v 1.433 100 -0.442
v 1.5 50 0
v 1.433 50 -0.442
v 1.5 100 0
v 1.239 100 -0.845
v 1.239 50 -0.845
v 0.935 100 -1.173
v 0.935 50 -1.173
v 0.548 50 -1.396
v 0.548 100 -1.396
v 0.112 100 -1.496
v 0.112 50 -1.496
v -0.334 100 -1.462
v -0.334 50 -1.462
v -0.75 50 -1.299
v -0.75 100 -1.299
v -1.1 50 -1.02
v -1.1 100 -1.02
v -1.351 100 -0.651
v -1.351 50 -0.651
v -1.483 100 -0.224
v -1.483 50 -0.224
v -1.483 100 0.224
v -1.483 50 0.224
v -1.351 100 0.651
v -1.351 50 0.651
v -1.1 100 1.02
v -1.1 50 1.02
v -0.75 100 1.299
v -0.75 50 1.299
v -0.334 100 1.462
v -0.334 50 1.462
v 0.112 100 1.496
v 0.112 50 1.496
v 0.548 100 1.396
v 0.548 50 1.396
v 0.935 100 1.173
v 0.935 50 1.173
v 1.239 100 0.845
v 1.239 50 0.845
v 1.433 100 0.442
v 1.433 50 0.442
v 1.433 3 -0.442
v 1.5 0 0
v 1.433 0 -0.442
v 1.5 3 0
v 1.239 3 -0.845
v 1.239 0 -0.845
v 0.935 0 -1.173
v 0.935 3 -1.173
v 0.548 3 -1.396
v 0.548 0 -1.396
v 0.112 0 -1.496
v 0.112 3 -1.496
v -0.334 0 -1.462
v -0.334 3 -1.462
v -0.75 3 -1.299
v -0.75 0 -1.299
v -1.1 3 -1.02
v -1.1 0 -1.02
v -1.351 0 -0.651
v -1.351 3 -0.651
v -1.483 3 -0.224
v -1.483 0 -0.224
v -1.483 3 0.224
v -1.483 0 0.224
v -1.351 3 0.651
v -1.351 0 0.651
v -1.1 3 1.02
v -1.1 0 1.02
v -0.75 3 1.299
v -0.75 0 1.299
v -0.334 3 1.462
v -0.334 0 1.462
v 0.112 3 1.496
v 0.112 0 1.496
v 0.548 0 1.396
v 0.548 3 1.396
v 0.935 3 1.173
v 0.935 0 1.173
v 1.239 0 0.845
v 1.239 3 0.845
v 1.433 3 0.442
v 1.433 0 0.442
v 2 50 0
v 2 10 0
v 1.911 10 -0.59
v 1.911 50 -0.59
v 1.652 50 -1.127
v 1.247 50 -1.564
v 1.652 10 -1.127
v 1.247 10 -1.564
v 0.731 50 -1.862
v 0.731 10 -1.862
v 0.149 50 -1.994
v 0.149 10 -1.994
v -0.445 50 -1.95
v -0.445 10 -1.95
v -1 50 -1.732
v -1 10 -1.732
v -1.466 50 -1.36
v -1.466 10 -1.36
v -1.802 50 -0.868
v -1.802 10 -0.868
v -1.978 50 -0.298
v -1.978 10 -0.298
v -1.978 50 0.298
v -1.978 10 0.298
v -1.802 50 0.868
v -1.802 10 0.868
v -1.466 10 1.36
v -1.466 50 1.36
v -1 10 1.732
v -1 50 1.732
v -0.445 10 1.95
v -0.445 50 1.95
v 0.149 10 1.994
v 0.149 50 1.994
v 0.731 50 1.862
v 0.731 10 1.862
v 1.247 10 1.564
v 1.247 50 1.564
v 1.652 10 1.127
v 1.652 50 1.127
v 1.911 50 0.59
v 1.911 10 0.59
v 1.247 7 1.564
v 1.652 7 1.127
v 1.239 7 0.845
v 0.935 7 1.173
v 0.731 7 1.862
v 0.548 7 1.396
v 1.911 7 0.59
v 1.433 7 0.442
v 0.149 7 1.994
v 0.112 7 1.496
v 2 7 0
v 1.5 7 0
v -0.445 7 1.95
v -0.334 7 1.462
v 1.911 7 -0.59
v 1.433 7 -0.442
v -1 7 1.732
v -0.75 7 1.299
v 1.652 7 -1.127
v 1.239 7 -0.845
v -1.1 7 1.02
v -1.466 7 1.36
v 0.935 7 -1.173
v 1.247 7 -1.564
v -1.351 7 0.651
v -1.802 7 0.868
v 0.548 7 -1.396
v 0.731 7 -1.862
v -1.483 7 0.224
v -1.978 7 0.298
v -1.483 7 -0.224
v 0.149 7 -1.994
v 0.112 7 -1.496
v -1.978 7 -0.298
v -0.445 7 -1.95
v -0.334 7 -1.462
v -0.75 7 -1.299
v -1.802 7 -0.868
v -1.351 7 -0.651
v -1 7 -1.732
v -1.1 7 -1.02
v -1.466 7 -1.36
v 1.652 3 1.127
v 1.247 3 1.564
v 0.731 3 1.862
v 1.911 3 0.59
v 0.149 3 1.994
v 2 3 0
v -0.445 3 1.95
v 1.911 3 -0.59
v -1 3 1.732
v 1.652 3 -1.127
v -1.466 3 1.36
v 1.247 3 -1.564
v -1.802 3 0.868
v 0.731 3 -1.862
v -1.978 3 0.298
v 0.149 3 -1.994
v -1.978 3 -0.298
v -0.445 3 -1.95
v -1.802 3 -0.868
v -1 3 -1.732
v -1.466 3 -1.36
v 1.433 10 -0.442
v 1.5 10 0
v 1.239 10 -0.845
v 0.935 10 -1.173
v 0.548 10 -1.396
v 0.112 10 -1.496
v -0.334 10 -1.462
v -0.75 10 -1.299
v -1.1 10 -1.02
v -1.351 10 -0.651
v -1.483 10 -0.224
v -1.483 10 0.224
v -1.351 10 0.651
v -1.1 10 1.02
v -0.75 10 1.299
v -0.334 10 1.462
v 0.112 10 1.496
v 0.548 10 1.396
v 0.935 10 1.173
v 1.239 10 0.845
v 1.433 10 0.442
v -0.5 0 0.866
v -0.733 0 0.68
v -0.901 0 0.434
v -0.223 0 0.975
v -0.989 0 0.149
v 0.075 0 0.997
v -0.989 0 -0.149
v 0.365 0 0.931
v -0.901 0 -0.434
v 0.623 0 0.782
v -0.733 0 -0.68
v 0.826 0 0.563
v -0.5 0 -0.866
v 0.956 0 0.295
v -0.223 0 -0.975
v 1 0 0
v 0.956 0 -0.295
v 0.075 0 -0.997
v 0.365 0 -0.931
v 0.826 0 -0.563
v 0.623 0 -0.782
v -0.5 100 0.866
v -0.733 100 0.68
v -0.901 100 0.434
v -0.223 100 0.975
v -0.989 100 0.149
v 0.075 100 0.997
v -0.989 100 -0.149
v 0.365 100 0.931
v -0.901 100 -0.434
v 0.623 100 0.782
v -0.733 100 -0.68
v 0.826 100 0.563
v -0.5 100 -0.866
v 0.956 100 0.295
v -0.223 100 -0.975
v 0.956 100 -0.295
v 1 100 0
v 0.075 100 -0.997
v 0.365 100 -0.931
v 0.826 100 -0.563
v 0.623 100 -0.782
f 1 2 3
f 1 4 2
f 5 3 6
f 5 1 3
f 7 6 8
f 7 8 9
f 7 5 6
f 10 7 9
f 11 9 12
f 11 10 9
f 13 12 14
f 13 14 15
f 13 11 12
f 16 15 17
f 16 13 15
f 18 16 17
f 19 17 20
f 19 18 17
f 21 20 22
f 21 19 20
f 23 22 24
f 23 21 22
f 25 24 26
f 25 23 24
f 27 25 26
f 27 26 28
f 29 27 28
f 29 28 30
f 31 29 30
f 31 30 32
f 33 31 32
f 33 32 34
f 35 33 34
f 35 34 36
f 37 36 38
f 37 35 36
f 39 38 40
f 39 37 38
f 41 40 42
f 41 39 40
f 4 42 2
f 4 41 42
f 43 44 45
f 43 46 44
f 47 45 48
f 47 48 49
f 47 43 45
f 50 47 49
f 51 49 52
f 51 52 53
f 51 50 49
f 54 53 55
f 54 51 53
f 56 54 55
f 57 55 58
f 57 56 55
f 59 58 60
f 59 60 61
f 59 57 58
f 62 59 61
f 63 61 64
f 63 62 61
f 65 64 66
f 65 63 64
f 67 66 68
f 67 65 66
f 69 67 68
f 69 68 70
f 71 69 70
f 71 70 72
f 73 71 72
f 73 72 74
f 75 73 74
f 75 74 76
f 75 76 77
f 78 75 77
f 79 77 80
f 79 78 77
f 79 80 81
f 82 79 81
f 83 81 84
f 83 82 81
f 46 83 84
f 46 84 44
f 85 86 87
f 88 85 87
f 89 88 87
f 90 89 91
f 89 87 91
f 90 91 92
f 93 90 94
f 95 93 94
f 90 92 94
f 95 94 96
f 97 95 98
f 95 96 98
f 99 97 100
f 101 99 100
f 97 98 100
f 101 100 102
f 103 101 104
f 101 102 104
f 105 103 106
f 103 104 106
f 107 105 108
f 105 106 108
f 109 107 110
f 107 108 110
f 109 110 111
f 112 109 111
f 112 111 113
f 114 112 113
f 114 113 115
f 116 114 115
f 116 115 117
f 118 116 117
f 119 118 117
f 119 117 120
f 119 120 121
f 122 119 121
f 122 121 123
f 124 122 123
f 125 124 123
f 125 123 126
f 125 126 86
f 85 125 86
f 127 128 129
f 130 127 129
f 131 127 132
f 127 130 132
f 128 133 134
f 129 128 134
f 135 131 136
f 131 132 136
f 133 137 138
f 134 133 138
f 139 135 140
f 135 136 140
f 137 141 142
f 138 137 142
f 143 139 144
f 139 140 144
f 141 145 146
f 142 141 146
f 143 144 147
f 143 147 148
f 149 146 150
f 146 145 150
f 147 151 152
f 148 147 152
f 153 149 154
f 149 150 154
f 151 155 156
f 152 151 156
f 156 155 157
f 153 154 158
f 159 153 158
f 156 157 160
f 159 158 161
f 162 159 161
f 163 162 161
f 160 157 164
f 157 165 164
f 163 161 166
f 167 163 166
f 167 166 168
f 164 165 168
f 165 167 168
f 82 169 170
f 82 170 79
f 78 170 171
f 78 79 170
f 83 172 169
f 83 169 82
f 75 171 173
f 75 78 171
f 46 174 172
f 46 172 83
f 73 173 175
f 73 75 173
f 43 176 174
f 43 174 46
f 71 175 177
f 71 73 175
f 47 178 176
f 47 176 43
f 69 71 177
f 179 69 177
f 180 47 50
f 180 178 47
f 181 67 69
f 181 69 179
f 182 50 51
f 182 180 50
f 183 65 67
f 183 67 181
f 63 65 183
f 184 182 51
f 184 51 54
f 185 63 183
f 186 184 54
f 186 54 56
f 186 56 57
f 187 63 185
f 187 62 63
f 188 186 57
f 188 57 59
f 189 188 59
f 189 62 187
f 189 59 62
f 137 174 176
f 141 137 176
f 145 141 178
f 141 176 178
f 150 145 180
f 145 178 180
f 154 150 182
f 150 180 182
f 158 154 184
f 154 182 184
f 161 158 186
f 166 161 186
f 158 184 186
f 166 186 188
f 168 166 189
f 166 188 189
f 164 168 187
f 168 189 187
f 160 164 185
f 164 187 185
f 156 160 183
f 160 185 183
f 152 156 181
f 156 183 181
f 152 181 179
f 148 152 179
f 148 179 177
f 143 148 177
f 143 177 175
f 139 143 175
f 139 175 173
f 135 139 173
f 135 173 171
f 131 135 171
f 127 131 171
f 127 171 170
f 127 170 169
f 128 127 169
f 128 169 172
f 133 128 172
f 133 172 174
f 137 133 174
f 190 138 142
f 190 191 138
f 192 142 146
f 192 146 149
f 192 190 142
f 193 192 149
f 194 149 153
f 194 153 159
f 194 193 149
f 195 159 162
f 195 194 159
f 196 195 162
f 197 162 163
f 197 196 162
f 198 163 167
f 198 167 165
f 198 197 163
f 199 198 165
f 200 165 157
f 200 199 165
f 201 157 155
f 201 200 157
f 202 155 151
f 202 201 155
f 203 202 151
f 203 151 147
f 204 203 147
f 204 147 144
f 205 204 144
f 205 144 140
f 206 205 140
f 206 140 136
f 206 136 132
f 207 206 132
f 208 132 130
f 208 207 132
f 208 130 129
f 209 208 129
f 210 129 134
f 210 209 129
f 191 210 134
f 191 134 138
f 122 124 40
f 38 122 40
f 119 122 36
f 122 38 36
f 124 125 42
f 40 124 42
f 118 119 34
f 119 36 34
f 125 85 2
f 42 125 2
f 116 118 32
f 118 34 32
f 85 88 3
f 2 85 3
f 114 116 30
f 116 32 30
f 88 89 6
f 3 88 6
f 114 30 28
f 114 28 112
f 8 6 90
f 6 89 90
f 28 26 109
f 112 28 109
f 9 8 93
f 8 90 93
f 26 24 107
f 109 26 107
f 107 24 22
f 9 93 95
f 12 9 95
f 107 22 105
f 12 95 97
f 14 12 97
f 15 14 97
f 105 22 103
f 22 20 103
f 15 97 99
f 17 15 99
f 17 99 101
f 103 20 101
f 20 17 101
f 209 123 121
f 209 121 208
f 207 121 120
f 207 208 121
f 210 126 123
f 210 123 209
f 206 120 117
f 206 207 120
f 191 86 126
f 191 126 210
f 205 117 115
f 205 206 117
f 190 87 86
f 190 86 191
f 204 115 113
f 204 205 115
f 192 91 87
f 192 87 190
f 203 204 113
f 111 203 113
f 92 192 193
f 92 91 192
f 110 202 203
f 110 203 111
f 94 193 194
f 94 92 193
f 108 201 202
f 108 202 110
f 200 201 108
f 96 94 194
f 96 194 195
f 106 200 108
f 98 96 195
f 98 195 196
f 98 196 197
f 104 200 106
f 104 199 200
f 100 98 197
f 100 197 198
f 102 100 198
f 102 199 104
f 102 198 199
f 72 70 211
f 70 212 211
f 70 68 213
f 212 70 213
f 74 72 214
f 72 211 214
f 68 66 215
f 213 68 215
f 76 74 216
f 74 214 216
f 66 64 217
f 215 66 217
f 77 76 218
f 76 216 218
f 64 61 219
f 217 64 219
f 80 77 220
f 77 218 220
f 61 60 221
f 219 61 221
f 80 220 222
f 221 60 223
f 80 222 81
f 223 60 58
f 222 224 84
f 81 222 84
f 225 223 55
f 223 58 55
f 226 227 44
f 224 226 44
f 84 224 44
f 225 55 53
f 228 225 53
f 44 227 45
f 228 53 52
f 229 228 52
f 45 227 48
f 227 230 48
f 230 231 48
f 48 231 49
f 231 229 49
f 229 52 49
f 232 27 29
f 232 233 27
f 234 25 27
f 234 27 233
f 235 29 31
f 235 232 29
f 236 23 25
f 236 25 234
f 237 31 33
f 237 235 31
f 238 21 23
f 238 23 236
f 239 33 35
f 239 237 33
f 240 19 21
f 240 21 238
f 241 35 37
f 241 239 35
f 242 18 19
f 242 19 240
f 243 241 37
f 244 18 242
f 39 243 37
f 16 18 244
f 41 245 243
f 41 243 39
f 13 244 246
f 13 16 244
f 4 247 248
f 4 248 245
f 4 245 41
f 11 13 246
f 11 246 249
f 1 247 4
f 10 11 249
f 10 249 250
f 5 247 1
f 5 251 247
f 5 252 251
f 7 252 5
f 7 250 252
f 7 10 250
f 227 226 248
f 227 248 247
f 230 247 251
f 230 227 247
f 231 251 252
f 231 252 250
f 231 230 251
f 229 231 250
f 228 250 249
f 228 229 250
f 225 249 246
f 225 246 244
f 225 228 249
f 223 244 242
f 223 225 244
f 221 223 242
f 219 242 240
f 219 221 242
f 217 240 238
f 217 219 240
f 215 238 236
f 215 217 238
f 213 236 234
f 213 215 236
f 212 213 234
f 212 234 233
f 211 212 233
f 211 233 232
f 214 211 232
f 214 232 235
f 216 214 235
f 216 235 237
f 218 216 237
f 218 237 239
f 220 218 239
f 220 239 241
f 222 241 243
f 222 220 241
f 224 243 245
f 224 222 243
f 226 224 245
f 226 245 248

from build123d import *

# Parameters (mm, degrees)
SKETCH_1_R      = 2
SKETCH_1_R_2    = 1
EXTRUDE_1_DEPTH = 100
SKETCH_2_W      = 0.5
SKETCH_2_H      = 3
SKETCH_4_W      = 0.5
SKETCH_4_H      = 50


with BuildPart() as part:
    # Эскиз1 → Бобышка-Вытянуть1 (new body)
    with BuildSketch(Plane(origin=(0, 0, 0), x_dir=(1, 0, 0), z_dir=(0, 1, 0))):
        Circle(SKETCH_1_R)
        Circle(SKETCH_1_R_2, mode=Mode.SUBTRACT)
    extrude(amount=EXTRUDE_1_DEPTH)

    # Эскиз2 → Вырез-Повернуть1 (revolve, cut)
    with BuildSketch(Plane.XY):
        with Locations((1.75, 1.5)):
            Rectangle(SKETCH_2_W, SKETCH_2_H)
        with Locations((1.75, 8.5)):
            Rectangle(SKETCH_2_W, SKETCH_2_H)
    revolve(axis=Axis((0, 0, 0), (0, 1, 0)), mode=Mode.SUBTRACT)

    # Эскиз4 → Вырез-Повернуть2 (revolve, cut)
    with BuildSketch(Plane.XY):
        with Locations((1.75, 75)):
            Rectangle(SKETCH_4_W, SKETCH_4_H)
    revolve(axis=Axis((0, 0, 0), (0, 1, 0)), mode=Mode.SUBTRACT)


solid = part.part
